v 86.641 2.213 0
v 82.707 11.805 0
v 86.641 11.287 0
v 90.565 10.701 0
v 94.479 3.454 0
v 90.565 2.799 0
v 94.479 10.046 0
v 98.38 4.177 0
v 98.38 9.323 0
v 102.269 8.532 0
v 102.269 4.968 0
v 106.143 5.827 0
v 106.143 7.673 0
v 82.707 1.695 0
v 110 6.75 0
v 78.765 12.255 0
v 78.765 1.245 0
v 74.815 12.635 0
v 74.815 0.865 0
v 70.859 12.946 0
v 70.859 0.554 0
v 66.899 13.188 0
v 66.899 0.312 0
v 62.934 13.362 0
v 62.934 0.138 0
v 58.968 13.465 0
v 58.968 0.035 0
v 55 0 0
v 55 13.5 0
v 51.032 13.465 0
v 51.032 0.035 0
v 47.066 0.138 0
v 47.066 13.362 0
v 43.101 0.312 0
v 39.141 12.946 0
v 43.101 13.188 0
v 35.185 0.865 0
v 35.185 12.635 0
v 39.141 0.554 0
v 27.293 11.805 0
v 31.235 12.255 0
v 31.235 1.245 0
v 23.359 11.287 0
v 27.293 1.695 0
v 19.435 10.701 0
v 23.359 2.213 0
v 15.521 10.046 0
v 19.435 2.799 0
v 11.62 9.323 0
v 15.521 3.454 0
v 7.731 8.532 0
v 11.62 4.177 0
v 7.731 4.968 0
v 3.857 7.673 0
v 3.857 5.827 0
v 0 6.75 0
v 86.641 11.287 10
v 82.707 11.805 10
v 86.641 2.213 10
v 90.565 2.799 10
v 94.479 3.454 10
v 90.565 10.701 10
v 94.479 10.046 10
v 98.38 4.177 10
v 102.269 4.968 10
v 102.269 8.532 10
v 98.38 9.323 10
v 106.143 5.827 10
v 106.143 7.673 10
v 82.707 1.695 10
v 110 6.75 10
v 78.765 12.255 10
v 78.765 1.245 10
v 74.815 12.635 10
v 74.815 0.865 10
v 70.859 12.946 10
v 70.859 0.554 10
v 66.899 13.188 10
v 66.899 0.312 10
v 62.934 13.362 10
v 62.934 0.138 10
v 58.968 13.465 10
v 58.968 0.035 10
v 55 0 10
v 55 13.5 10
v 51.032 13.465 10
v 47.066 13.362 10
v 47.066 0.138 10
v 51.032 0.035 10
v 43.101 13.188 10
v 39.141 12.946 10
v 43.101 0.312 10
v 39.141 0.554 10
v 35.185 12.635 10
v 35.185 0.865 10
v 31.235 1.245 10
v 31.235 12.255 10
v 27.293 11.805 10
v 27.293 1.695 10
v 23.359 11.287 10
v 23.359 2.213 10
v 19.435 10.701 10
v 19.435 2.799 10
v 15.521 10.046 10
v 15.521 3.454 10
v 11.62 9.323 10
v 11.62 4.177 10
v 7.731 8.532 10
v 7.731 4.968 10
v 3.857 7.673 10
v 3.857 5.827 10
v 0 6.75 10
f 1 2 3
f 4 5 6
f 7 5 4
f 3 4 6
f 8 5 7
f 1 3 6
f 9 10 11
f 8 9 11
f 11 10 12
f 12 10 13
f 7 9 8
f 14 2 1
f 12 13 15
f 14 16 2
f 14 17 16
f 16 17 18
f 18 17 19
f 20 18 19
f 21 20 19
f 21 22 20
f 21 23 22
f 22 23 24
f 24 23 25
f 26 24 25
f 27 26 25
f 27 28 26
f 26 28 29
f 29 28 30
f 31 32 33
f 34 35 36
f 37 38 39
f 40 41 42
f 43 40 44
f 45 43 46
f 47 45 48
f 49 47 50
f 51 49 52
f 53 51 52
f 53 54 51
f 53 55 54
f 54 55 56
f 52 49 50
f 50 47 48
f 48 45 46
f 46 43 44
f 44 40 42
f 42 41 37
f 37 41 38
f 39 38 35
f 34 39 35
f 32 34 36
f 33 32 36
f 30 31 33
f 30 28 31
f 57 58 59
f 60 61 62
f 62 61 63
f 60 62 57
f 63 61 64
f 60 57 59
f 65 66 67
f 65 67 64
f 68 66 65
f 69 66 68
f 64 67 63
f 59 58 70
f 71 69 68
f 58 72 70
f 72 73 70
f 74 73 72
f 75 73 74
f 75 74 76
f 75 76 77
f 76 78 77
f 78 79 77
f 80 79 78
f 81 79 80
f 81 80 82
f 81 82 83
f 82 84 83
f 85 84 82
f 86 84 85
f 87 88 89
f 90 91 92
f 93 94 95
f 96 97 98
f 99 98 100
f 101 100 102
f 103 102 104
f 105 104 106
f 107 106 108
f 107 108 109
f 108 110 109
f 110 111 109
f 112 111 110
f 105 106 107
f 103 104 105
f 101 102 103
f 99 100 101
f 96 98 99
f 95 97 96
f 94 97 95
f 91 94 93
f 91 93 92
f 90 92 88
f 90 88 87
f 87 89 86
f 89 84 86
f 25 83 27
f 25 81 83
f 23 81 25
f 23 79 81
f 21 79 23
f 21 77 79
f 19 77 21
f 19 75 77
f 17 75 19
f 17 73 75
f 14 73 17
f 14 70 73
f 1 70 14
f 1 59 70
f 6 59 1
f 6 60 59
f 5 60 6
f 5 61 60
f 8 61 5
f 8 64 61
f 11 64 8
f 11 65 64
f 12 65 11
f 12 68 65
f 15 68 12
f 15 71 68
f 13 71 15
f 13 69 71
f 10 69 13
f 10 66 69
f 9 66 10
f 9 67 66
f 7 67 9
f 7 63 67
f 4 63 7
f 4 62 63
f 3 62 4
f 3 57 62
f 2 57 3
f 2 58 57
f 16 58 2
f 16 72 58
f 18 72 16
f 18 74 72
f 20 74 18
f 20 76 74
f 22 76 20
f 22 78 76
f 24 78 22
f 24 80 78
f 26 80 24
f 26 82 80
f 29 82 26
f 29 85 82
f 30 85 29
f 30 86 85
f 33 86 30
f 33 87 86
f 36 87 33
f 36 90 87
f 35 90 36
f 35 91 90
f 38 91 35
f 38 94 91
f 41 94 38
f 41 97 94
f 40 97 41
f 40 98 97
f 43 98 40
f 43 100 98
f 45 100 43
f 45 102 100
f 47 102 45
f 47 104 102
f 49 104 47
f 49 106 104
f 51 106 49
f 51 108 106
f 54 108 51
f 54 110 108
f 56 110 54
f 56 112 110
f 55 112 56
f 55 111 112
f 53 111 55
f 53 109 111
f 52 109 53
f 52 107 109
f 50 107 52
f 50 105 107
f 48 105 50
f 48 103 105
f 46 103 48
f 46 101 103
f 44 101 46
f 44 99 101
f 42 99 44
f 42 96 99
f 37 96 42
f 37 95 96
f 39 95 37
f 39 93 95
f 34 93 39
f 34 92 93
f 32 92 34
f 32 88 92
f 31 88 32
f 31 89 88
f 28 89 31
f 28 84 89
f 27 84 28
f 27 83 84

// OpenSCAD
$fn = 32;

// ----------------------------------------------------------------------
// Arc profile plate: lens, 56 points
// ----------------------------------------------------------------------

// --- parameters (mm) ---
lens_chord = 110;         // chord length of the lens, X
arc_r = 227.35;           // radius of both arcs
arc_angle = 28;           // angle of each arc, degrees
sagitta = 6.75;           // bulge of each arc (half the lens height)
arc_step = 1;             // sampling step of the arcs, degrees
plate_t = 10;             // plate thickness, Z

bbox_y = 2 * sagitta;  // full lens height

profile = [[110, 6.75], [106.143, 7.673], [102.269, 8.532], [98.38, 9.323], [94.479, 10.046], [90.565, 10.701], [86.641, 11.287], [82.707, 11.805], [78.765, 12.255], [74.815, 12.635], [70.859, 12.946], [66.899, 13.188], [62.934, 13.362], [58.968, 13.465], [55, 13.5], [51.032, 13.465], [47.066, 13.362], [43.101, 13.188], [39.141, 12.946], [35.185, 12.635], [31.235, 12.255], [27.293, 11.805], [23.359, 11.287], [19.435, 10.701], [15.521, 10.046], [11.62, 9.323], [7.731, 8.532], [3.857, 7.673], [0, 6.75], [3.857, 5.827], [7.731, 4.968], [11.62, 4.177], [15.521, 3.454], [19.435, 2.799], [23.359, 2.213], [27.293, 1.695], [31.235, 1.245], [35.185, 0.865], [39.141, 0.554], [43.101, 0.312], [47.066, 0.138], [51.032, 0.035], [55, 0], [58.968, 0.035], [62.934, 0.138], [66.899, 0.312], [70.859, 0.554], [74.815, 0.865], [78.765, 1.245], [82.707, 1.695], [86.641, 2.213], [90.565, 2.799], [94.479, 3.454], [98.38, 4.177], [102.269, 4.968], [106.143, 5.827]];  // primary outline, 56 points, counter clockwise

// --- the one profile operation ---
linear_extrude(height = plate_t) polygon(points = profile);
